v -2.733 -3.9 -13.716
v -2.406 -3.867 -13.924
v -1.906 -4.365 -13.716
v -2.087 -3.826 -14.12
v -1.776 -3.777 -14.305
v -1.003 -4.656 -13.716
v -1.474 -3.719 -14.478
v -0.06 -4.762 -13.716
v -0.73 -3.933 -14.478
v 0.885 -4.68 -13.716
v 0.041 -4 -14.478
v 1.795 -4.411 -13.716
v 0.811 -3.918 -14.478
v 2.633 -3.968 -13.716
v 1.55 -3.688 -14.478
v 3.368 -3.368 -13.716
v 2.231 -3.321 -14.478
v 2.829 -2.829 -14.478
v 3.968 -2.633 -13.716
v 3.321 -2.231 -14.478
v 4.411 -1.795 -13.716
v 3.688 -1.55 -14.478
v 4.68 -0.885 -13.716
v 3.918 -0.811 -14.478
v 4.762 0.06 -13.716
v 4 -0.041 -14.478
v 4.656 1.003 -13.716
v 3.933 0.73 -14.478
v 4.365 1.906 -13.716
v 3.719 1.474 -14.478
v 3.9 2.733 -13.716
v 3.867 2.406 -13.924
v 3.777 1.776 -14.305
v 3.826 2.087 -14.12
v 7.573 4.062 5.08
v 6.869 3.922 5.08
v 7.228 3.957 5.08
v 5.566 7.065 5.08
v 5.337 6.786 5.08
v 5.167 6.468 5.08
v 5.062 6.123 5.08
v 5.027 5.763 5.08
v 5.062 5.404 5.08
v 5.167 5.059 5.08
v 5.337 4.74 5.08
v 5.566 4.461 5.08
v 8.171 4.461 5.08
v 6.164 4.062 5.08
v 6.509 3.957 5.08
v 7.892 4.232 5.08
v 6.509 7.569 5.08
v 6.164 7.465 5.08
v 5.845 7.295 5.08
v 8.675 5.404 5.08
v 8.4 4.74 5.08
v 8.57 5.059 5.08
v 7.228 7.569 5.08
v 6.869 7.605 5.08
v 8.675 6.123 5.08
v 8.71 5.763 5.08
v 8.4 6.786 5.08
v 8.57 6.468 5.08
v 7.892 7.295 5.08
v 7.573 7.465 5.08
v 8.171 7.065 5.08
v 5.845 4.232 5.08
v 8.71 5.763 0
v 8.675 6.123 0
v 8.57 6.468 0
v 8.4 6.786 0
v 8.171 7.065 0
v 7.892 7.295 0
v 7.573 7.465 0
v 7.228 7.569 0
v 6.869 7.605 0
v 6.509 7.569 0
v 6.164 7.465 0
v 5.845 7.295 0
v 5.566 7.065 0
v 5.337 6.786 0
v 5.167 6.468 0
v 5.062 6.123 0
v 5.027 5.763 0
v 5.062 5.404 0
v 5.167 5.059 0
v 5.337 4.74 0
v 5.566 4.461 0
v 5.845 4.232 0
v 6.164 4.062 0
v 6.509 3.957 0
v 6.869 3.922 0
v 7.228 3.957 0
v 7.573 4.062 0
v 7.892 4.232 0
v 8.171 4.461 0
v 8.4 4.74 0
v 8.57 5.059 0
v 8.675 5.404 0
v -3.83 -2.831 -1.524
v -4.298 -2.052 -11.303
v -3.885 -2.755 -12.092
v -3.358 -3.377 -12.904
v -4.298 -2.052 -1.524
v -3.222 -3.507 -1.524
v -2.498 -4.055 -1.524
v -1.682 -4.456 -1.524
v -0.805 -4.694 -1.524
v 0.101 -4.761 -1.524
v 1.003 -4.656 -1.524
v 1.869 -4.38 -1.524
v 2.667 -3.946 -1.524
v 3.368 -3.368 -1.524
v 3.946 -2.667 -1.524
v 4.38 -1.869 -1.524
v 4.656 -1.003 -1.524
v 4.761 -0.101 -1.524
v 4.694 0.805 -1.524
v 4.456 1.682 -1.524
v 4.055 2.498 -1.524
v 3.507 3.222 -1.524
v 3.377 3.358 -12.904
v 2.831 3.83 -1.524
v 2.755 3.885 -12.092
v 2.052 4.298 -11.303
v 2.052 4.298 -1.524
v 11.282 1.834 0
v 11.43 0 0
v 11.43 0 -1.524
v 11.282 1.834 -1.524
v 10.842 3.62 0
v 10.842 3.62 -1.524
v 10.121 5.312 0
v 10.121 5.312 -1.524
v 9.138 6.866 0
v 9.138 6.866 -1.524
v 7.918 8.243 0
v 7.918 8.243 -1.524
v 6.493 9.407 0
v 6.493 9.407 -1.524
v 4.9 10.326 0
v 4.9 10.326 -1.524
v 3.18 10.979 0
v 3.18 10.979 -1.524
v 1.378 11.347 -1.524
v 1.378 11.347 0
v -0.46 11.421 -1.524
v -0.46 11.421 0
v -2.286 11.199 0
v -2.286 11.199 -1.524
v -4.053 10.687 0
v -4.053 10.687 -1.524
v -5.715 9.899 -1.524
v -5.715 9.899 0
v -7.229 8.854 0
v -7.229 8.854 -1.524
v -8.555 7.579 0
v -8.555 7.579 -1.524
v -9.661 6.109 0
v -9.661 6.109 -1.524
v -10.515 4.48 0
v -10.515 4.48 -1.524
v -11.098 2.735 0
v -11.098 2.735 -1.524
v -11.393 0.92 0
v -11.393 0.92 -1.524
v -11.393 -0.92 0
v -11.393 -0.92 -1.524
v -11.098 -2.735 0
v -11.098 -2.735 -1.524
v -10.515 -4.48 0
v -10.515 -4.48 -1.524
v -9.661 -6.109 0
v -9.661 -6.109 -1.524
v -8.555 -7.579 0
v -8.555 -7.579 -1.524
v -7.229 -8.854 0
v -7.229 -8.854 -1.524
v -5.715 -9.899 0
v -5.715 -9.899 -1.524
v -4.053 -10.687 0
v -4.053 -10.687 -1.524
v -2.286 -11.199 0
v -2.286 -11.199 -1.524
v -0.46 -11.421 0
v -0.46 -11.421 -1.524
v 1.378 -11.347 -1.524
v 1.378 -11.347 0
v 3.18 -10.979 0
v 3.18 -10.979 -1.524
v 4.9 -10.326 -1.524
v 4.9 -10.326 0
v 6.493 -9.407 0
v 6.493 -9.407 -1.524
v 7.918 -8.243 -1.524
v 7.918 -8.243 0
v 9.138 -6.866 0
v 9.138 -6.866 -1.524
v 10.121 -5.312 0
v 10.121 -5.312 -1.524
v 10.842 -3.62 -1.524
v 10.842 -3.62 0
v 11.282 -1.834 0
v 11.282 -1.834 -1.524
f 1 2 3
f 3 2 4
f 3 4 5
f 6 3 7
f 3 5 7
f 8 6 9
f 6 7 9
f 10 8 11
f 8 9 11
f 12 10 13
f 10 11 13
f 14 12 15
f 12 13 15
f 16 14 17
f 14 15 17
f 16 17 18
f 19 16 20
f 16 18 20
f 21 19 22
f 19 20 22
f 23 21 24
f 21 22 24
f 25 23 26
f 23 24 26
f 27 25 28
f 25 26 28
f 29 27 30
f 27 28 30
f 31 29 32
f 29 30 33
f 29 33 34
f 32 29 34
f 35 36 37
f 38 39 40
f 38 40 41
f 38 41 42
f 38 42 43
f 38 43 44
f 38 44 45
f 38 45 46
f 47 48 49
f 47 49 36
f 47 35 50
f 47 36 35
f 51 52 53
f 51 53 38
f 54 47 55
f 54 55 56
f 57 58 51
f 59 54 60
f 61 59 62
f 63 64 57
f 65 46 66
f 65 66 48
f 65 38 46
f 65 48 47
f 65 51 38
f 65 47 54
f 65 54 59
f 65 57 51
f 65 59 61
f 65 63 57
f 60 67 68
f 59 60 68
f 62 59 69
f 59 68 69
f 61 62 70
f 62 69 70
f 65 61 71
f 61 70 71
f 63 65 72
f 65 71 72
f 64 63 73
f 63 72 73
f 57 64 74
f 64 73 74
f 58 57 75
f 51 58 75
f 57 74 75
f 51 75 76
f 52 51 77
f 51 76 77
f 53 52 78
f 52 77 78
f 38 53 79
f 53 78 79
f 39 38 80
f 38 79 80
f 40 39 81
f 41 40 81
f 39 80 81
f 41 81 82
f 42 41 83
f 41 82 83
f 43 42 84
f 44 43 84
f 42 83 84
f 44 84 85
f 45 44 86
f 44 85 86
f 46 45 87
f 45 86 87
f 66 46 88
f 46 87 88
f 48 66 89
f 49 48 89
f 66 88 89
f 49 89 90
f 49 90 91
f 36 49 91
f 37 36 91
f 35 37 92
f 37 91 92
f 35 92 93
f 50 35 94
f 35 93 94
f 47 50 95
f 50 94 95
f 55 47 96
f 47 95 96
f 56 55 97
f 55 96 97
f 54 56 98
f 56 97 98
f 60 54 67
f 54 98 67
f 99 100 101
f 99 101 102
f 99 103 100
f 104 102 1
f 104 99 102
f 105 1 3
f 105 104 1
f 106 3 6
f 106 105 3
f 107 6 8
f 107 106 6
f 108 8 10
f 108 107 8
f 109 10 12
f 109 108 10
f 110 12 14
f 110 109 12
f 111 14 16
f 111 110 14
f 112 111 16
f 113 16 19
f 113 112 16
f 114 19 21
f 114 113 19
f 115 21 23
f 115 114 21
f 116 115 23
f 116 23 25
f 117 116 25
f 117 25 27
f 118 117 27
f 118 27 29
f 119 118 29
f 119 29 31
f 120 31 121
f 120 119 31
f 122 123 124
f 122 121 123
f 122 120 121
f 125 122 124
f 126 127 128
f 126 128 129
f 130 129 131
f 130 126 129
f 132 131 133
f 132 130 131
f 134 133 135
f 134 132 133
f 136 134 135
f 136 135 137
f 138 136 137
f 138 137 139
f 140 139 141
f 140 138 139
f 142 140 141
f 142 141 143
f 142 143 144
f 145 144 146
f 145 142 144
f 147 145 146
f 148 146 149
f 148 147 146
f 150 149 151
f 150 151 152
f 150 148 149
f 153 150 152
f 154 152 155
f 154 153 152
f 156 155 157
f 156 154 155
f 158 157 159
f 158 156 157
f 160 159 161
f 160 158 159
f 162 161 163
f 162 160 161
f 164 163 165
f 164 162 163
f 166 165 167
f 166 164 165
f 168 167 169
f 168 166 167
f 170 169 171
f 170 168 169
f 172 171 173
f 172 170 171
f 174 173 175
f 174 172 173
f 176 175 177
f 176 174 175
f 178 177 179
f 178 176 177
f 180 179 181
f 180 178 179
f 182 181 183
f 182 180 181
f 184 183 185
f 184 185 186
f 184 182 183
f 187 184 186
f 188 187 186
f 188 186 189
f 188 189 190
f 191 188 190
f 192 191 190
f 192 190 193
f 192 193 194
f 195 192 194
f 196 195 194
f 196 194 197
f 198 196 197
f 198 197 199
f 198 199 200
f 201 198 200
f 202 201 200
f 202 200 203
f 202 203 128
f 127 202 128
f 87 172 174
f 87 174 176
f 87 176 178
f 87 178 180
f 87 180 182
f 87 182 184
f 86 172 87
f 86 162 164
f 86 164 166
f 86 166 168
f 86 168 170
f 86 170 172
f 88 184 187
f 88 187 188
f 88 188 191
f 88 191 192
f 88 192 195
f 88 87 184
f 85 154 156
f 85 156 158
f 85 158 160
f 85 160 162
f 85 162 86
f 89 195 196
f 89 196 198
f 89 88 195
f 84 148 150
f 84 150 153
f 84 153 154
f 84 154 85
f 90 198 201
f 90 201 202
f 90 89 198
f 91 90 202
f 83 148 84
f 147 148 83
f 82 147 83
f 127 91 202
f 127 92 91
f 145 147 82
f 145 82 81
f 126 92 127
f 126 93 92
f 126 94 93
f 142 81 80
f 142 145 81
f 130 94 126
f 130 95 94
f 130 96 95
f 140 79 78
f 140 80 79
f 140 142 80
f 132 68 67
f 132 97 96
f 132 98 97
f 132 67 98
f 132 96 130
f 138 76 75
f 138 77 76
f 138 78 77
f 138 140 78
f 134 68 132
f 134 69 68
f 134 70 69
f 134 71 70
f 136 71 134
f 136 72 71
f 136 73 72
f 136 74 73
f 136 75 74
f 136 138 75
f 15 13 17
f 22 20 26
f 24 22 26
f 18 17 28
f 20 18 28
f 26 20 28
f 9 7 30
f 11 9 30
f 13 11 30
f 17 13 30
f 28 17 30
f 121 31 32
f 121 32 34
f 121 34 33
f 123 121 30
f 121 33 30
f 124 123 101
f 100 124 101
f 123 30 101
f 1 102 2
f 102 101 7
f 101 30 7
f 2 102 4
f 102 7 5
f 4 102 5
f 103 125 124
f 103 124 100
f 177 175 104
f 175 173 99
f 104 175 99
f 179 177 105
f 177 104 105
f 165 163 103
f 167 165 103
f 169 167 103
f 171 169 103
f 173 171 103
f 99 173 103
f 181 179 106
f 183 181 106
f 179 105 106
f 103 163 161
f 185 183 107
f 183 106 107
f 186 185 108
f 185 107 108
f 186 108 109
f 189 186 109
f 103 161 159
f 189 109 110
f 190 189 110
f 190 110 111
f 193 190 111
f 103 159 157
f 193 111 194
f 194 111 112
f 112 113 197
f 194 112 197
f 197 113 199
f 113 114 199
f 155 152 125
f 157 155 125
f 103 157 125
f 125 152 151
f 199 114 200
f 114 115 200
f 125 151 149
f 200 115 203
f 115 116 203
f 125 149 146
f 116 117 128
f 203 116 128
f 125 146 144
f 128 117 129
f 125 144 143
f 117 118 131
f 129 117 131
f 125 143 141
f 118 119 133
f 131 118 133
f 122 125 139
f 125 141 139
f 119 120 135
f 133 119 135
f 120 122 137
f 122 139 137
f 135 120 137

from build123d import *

# Parameters (mm, degrees)
SKETCH1_R           = 11.43
BOSS_EXTRUDE1_DEPTH = 1.524
BOSS_EXTRUDE2_DEPTH = 12.954
CHAMFER1_SIZE       = 3.175
CHAMFER2_SIZE       = 0.762
SKETCH3_R           = 1.8415
BOSS_EXTRUDE3_DEPTH = 5.08


with BuildPart() as part:
    # Sketch1 → Boss-Extrude1 (new body)
    with BuildSketch(Plane.XY):
        Circle(SKETCH1_R)
    extrude(amount=-BOSS_EXTRUDE1_DEPTH)

    # Sketch2 → Boss-Extrude2 (add)
    with BuildSketch(Plane(origin=(0, 0, -1.524), x_dir=(-1, 0, 0), z_dir=(0, 0, -1))):
        with BuildLine():
            Line((-2.052467985, 4.297532015), (4.297532015, -2.052467985))
            ThreePointArc((4.297532015, -2.052467985), (-3.367596045, -3.367596045), (-2.052467985, 4.297532015))
        make_face()
    extrude(amount=BOSS_EXTRUDE2_DEPTH)

    # Chamfer1
    chamfer1_edges = [part.edges().sort_by_distance(p)[0] for p in [
        (-1.122532015, 1.122532015, -14.478),
    ]]
    chamfer(chamfer1_edges, length=CHAMFER1_SIZE)

    # Chamfer2
    chamfer2_edges = [part.edges().sort_by_distance(p)[0] for p in [
        (3.367596045, -3.367596045, -14.478),
    ]]
    chamfer(chamfer2_edges, length=CHAMFER2_SIZE)

    # Sketch3 → Boss-Extrude3 (add)
    with BuildSketch(Plane.XY):
        with Locations((6.868507686, 5.763362266)):
            Circle(SKETCH3_R)
    extrude(amount=BOSS_EXTRUDE3_DEPTH)


solid = part.part
